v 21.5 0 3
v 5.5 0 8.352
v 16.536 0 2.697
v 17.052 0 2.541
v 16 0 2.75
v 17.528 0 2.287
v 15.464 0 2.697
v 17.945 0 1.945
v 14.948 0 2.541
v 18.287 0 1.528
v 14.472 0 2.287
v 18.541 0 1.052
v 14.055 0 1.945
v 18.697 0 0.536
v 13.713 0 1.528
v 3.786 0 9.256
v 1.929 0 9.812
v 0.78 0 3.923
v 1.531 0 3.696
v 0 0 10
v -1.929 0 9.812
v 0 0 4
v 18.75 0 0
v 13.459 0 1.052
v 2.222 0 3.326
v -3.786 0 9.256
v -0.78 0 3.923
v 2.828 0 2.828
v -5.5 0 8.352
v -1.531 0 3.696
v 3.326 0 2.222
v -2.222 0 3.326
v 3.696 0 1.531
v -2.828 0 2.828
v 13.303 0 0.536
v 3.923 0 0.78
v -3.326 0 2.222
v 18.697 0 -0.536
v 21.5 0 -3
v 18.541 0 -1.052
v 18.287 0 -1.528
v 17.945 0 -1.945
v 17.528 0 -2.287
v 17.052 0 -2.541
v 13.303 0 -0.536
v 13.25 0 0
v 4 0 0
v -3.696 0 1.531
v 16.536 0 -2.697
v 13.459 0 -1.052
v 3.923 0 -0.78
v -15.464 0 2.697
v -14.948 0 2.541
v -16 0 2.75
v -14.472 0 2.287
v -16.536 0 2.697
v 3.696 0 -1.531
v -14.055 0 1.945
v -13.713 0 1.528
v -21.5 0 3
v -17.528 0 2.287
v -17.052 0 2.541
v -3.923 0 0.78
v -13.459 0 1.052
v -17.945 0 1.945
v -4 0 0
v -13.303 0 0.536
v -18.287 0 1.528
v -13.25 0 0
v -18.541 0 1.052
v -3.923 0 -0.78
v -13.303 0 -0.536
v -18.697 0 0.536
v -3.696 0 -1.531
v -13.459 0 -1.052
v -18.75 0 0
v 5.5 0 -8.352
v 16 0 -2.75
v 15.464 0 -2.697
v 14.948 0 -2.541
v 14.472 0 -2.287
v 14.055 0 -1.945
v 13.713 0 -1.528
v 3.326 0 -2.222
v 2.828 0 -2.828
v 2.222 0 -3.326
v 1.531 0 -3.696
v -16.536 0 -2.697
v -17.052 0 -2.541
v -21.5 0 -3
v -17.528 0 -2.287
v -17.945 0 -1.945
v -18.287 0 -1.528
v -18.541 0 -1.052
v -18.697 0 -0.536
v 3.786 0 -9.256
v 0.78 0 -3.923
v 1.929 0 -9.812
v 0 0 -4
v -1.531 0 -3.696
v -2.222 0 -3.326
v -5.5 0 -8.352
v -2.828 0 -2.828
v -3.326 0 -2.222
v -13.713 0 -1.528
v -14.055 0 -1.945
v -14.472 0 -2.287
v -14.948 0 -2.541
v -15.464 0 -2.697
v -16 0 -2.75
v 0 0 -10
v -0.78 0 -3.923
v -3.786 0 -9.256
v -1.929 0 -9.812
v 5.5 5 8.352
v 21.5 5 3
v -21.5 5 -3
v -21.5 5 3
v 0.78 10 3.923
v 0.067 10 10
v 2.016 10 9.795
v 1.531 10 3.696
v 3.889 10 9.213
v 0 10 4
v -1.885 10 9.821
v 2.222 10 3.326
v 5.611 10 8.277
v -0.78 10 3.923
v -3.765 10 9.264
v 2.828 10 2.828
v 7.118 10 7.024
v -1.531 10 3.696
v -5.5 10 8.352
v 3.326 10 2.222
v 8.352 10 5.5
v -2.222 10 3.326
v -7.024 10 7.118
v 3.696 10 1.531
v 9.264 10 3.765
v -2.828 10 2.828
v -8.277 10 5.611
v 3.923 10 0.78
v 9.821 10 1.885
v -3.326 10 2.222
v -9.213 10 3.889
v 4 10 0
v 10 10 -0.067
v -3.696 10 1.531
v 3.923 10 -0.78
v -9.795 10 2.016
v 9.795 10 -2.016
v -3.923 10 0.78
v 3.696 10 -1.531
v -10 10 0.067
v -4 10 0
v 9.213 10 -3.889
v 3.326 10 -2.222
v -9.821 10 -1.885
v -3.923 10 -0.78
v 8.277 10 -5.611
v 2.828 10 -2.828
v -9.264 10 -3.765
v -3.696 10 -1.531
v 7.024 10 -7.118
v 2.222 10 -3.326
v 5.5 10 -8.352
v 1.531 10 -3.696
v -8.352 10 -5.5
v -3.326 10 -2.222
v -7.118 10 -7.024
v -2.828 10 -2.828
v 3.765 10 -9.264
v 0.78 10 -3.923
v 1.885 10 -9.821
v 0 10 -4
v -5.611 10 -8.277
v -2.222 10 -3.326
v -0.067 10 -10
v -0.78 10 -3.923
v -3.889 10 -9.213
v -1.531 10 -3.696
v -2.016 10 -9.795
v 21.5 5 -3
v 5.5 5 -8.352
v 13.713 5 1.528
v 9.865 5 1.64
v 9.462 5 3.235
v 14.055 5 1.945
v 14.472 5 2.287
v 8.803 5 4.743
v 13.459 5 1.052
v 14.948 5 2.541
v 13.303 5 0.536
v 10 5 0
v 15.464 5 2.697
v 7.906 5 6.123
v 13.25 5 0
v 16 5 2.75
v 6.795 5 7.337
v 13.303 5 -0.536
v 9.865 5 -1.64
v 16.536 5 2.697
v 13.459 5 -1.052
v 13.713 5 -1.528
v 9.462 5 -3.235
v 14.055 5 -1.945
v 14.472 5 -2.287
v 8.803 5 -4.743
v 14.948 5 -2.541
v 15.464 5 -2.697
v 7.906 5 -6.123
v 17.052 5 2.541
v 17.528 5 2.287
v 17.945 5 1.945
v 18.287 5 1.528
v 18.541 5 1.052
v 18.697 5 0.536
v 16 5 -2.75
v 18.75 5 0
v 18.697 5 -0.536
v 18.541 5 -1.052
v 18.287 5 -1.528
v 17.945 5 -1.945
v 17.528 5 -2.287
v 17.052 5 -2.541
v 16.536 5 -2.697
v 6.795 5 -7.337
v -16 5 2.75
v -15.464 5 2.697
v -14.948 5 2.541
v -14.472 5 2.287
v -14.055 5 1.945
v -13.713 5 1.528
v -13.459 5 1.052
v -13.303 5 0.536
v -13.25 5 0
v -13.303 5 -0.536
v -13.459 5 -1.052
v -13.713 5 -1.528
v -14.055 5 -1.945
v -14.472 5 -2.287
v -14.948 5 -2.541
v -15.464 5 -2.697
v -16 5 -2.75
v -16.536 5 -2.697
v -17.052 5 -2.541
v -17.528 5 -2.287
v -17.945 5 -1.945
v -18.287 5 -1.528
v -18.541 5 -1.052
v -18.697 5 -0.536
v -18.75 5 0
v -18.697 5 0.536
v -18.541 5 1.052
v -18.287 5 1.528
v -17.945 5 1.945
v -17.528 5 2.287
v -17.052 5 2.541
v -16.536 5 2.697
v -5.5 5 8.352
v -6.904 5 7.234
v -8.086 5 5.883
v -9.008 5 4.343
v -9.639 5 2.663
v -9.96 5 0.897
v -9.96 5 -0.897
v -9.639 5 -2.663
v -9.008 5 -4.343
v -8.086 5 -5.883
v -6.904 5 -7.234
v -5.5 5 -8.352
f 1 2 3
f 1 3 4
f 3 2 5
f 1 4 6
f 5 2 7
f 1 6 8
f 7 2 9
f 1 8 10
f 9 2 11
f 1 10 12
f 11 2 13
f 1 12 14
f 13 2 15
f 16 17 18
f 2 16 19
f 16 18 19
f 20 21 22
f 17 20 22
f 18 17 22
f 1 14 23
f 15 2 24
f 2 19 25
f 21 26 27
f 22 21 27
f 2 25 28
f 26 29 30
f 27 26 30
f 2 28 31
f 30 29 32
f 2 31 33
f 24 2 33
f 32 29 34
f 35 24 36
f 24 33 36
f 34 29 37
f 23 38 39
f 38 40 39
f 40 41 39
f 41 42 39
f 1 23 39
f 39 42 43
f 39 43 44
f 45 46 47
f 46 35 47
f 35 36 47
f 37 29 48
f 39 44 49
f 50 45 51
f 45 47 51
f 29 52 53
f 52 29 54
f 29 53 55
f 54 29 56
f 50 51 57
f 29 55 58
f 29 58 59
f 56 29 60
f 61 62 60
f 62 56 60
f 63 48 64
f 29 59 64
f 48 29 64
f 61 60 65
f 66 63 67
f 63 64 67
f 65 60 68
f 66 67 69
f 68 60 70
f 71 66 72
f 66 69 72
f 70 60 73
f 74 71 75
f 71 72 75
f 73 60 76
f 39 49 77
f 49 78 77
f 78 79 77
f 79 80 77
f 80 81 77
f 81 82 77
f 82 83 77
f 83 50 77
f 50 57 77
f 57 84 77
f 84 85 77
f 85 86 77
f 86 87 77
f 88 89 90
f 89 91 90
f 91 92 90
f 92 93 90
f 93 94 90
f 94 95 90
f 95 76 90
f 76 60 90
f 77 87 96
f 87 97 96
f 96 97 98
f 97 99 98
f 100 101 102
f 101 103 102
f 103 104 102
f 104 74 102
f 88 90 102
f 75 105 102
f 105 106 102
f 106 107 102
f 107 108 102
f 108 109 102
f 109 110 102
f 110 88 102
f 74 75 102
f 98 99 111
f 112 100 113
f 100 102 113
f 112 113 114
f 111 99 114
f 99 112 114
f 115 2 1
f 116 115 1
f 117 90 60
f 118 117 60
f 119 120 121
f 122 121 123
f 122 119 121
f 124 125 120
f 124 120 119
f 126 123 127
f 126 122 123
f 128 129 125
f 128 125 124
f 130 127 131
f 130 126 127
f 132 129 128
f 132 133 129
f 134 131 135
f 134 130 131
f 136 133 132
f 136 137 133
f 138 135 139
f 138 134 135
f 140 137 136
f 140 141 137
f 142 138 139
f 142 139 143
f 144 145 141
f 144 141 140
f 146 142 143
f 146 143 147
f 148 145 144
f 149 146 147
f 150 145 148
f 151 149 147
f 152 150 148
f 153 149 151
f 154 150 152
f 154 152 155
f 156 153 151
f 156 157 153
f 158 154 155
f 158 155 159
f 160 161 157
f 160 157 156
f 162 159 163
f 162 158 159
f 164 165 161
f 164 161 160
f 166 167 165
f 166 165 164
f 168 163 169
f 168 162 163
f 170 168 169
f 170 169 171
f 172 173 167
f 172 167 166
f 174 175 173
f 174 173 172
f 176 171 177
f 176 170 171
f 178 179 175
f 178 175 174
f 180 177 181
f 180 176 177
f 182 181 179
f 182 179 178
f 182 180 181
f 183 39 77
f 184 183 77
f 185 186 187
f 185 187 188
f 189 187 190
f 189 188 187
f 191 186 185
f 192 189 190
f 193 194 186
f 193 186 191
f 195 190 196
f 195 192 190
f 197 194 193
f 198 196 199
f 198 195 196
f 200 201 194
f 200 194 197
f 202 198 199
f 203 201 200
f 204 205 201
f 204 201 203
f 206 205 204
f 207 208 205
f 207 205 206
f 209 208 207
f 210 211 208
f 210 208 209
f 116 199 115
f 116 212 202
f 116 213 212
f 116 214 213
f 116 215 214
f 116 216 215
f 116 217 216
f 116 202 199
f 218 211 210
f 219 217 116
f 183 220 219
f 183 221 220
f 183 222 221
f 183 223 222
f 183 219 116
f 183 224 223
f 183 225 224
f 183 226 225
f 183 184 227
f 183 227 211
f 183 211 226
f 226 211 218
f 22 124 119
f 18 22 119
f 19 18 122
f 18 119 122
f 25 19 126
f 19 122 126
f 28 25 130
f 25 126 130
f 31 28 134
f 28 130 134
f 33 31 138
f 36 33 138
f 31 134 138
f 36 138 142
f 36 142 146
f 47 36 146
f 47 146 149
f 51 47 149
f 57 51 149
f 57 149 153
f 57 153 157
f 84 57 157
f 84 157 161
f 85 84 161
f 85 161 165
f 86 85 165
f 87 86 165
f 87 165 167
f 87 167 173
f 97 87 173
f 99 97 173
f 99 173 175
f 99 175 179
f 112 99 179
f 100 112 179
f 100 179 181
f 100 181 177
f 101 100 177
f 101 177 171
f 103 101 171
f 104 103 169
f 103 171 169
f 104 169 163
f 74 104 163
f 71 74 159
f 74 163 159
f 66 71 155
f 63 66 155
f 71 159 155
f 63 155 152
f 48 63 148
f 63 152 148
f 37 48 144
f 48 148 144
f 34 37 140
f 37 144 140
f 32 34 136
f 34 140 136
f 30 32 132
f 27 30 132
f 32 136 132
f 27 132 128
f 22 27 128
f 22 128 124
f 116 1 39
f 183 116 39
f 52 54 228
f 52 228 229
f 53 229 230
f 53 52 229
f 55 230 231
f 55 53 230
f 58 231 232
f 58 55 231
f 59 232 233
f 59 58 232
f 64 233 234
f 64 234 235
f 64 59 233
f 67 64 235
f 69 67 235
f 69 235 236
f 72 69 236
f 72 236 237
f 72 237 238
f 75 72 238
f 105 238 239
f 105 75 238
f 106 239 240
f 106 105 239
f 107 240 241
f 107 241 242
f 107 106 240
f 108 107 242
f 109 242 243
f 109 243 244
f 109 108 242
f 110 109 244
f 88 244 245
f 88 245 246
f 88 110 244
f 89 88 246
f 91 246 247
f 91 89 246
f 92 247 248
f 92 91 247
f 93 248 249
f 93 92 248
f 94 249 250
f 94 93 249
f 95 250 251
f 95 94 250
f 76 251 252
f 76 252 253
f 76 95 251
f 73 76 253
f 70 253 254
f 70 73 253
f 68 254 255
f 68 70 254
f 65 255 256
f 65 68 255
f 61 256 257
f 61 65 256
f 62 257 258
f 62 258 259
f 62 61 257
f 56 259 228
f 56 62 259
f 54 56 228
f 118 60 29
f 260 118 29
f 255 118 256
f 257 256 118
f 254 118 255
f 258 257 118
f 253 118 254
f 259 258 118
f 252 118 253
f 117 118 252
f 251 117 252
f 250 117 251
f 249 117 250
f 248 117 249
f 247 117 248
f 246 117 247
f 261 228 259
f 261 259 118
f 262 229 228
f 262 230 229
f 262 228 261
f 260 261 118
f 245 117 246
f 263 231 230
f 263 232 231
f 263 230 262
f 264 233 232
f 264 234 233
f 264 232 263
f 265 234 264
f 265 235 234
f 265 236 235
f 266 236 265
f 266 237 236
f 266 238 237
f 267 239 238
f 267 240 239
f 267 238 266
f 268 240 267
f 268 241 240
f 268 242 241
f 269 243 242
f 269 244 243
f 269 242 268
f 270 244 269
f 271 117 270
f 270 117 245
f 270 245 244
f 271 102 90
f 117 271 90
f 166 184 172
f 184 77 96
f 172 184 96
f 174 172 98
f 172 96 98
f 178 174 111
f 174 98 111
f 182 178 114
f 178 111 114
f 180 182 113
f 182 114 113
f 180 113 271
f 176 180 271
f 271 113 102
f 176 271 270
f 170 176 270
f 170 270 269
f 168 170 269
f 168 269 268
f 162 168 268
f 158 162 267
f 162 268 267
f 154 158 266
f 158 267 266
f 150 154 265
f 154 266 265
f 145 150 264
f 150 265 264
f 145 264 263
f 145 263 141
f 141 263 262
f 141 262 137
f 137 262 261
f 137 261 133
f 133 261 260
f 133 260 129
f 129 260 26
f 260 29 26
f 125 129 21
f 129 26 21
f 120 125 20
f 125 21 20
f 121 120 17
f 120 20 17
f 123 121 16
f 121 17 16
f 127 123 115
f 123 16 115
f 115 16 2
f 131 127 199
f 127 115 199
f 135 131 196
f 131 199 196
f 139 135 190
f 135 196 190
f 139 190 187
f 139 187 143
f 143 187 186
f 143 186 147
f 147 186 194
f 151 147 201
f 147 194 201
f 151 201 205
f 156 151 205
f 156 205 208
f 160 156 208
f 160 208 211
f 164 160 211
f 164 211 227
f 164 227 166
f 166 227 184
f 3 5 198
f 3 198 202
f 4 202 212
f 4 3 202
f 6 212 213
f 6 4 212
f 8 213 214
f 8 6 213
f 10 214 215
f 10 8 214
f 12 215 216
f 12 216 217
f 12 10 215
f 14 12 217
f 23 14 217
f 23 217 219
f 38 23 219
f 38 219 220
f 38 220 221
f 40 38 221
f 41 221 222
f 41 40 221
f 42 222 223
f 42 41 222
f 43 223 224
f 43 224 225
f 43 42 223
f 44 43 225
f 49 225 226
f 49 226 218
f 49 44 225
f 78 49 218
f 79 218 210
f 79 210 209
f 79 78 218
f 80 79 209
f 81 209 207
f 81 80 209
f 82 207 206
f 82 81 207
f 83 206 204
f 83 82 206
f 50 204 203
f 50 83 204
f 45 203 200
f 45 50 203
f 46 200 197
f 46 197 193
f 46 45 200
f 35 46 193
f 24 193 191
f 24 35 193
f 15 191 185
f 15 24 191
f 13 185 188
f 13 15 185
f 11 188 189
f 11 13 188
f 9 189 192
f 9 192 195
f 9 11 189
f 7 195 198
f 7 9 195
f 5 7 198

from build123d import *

# Parameters (mm, degrees)
SKETCH1_R             = 2.75
BOSS_EXTRUDE1_DEPTH   = 5
BOSS_EXTRUDE1_2_DEPTH = 5
BOSS_EXTRUDE2_DEPTH   = 10
SKETCH2_R             = 4
CUT_EXTRUDE1_DEPTH    = 26.734218465


with BuildPart() as part:
    # Sketch1 → Boss-Extrude1 (new body)
    with BuildSketch(Plane(origin=(0, 0, 0), x_dir=(1, 0, 0), z_dir=(0, 1, 0))):
        with BuildLine():
            Line((21.5, -3), (21.5, 3))
            Line((21.5, 3), (5.5, 8.351646544))
            ThreePointArc((5.5, 8.351646544), (10, 0), (5.5, -8.351646544))
            Line((5.5, -8.351646544), (21.5, -3))
        make_face()
        with Locations((16, 0)):
            Circle(SKETCH1_R, mode=Mode.SUBTRACT)
    extrude(amount=BOSS_EXTRUDE1_DEPTH)



with BuildPart() as body_2:
    # Sketch1 → Boss-Extrude1 2 (new body)
    with BuildSketch(Plane(origin=(0, 0, 0), x_dir=(1, 0, 0), z_dir=(0, 1, 0))):
        with BuildLine():
            ThreePointArc((-5.5, -8.351646544), (-10, 0), (-5.5, 8.351646544))
            Line((-5.5, 8.351646544), (-21.5, 3))
            Line((-21.5, 3), (-21.5, -3))
            Line((-21.5, -3), (-5.5, -8.351646544))
        make_face()
        with Locations((-16, 0)):
            Circle(SKETCH1_R, mode=Mode.SUBTRACT)
    extrude(amount=BOSS_EXTRUDE1_2_DEPTH)


with BuildPart() as part_1:
    add(part.part)

    add(body_2.part)  # Boss-Extrude2 merges body 2
    # Sketch1<3> → Boss-Extrude2 (add)
    with BuildSketch(Plane(origin=(0, 0, 0), x_dir=(1, 0, 0), z_dir=(0, 1, 0))):
        with BuildLine():
            ThreePointArc((5.5, 8.351646544), (2.870847848, 9.579051761), (3.1e-08, 10))
            ThreePointArc((3.1e-08, 10), (-2.870847818, 9.57905177), (-5.5, 8.351646544))
            ThreePointArc((-5.5, 8.351646544), (-10, 0), (-5.5, -8.351646544))
            ThreePointArc((-5.5, -8.351646544), (-2.870847833, -9.579051765), (0, -10))
            ThreePointArc((0, -10), (2.870847833, -9.579051765), (5.5, -8.351646544))
            ThreePointArc((5.5, -8.351646544), (8.803408431, -4.74341649), (10, 0))
            ThreePointArc((10, 0), (8.803408431, 4.74341649), (5.5, 8.351646544))
        make_face()
    extrude(amount=BOSS_EXTRUDE2_DEPTH)

    # Sketch2 → Cut-Extrude1 (cut, through all)
    with BuildSketch(Plane(origin=(0, 10, 0), x_dir=(1, 0, 0), z_dir=(0, 1, 0))):
        Circle(SKETCH2_R)
    extrude(amount=-CUT_EXTRUDE1_DEPTH, mode=Mode.SUBTRACT)


solid = part_1.part
